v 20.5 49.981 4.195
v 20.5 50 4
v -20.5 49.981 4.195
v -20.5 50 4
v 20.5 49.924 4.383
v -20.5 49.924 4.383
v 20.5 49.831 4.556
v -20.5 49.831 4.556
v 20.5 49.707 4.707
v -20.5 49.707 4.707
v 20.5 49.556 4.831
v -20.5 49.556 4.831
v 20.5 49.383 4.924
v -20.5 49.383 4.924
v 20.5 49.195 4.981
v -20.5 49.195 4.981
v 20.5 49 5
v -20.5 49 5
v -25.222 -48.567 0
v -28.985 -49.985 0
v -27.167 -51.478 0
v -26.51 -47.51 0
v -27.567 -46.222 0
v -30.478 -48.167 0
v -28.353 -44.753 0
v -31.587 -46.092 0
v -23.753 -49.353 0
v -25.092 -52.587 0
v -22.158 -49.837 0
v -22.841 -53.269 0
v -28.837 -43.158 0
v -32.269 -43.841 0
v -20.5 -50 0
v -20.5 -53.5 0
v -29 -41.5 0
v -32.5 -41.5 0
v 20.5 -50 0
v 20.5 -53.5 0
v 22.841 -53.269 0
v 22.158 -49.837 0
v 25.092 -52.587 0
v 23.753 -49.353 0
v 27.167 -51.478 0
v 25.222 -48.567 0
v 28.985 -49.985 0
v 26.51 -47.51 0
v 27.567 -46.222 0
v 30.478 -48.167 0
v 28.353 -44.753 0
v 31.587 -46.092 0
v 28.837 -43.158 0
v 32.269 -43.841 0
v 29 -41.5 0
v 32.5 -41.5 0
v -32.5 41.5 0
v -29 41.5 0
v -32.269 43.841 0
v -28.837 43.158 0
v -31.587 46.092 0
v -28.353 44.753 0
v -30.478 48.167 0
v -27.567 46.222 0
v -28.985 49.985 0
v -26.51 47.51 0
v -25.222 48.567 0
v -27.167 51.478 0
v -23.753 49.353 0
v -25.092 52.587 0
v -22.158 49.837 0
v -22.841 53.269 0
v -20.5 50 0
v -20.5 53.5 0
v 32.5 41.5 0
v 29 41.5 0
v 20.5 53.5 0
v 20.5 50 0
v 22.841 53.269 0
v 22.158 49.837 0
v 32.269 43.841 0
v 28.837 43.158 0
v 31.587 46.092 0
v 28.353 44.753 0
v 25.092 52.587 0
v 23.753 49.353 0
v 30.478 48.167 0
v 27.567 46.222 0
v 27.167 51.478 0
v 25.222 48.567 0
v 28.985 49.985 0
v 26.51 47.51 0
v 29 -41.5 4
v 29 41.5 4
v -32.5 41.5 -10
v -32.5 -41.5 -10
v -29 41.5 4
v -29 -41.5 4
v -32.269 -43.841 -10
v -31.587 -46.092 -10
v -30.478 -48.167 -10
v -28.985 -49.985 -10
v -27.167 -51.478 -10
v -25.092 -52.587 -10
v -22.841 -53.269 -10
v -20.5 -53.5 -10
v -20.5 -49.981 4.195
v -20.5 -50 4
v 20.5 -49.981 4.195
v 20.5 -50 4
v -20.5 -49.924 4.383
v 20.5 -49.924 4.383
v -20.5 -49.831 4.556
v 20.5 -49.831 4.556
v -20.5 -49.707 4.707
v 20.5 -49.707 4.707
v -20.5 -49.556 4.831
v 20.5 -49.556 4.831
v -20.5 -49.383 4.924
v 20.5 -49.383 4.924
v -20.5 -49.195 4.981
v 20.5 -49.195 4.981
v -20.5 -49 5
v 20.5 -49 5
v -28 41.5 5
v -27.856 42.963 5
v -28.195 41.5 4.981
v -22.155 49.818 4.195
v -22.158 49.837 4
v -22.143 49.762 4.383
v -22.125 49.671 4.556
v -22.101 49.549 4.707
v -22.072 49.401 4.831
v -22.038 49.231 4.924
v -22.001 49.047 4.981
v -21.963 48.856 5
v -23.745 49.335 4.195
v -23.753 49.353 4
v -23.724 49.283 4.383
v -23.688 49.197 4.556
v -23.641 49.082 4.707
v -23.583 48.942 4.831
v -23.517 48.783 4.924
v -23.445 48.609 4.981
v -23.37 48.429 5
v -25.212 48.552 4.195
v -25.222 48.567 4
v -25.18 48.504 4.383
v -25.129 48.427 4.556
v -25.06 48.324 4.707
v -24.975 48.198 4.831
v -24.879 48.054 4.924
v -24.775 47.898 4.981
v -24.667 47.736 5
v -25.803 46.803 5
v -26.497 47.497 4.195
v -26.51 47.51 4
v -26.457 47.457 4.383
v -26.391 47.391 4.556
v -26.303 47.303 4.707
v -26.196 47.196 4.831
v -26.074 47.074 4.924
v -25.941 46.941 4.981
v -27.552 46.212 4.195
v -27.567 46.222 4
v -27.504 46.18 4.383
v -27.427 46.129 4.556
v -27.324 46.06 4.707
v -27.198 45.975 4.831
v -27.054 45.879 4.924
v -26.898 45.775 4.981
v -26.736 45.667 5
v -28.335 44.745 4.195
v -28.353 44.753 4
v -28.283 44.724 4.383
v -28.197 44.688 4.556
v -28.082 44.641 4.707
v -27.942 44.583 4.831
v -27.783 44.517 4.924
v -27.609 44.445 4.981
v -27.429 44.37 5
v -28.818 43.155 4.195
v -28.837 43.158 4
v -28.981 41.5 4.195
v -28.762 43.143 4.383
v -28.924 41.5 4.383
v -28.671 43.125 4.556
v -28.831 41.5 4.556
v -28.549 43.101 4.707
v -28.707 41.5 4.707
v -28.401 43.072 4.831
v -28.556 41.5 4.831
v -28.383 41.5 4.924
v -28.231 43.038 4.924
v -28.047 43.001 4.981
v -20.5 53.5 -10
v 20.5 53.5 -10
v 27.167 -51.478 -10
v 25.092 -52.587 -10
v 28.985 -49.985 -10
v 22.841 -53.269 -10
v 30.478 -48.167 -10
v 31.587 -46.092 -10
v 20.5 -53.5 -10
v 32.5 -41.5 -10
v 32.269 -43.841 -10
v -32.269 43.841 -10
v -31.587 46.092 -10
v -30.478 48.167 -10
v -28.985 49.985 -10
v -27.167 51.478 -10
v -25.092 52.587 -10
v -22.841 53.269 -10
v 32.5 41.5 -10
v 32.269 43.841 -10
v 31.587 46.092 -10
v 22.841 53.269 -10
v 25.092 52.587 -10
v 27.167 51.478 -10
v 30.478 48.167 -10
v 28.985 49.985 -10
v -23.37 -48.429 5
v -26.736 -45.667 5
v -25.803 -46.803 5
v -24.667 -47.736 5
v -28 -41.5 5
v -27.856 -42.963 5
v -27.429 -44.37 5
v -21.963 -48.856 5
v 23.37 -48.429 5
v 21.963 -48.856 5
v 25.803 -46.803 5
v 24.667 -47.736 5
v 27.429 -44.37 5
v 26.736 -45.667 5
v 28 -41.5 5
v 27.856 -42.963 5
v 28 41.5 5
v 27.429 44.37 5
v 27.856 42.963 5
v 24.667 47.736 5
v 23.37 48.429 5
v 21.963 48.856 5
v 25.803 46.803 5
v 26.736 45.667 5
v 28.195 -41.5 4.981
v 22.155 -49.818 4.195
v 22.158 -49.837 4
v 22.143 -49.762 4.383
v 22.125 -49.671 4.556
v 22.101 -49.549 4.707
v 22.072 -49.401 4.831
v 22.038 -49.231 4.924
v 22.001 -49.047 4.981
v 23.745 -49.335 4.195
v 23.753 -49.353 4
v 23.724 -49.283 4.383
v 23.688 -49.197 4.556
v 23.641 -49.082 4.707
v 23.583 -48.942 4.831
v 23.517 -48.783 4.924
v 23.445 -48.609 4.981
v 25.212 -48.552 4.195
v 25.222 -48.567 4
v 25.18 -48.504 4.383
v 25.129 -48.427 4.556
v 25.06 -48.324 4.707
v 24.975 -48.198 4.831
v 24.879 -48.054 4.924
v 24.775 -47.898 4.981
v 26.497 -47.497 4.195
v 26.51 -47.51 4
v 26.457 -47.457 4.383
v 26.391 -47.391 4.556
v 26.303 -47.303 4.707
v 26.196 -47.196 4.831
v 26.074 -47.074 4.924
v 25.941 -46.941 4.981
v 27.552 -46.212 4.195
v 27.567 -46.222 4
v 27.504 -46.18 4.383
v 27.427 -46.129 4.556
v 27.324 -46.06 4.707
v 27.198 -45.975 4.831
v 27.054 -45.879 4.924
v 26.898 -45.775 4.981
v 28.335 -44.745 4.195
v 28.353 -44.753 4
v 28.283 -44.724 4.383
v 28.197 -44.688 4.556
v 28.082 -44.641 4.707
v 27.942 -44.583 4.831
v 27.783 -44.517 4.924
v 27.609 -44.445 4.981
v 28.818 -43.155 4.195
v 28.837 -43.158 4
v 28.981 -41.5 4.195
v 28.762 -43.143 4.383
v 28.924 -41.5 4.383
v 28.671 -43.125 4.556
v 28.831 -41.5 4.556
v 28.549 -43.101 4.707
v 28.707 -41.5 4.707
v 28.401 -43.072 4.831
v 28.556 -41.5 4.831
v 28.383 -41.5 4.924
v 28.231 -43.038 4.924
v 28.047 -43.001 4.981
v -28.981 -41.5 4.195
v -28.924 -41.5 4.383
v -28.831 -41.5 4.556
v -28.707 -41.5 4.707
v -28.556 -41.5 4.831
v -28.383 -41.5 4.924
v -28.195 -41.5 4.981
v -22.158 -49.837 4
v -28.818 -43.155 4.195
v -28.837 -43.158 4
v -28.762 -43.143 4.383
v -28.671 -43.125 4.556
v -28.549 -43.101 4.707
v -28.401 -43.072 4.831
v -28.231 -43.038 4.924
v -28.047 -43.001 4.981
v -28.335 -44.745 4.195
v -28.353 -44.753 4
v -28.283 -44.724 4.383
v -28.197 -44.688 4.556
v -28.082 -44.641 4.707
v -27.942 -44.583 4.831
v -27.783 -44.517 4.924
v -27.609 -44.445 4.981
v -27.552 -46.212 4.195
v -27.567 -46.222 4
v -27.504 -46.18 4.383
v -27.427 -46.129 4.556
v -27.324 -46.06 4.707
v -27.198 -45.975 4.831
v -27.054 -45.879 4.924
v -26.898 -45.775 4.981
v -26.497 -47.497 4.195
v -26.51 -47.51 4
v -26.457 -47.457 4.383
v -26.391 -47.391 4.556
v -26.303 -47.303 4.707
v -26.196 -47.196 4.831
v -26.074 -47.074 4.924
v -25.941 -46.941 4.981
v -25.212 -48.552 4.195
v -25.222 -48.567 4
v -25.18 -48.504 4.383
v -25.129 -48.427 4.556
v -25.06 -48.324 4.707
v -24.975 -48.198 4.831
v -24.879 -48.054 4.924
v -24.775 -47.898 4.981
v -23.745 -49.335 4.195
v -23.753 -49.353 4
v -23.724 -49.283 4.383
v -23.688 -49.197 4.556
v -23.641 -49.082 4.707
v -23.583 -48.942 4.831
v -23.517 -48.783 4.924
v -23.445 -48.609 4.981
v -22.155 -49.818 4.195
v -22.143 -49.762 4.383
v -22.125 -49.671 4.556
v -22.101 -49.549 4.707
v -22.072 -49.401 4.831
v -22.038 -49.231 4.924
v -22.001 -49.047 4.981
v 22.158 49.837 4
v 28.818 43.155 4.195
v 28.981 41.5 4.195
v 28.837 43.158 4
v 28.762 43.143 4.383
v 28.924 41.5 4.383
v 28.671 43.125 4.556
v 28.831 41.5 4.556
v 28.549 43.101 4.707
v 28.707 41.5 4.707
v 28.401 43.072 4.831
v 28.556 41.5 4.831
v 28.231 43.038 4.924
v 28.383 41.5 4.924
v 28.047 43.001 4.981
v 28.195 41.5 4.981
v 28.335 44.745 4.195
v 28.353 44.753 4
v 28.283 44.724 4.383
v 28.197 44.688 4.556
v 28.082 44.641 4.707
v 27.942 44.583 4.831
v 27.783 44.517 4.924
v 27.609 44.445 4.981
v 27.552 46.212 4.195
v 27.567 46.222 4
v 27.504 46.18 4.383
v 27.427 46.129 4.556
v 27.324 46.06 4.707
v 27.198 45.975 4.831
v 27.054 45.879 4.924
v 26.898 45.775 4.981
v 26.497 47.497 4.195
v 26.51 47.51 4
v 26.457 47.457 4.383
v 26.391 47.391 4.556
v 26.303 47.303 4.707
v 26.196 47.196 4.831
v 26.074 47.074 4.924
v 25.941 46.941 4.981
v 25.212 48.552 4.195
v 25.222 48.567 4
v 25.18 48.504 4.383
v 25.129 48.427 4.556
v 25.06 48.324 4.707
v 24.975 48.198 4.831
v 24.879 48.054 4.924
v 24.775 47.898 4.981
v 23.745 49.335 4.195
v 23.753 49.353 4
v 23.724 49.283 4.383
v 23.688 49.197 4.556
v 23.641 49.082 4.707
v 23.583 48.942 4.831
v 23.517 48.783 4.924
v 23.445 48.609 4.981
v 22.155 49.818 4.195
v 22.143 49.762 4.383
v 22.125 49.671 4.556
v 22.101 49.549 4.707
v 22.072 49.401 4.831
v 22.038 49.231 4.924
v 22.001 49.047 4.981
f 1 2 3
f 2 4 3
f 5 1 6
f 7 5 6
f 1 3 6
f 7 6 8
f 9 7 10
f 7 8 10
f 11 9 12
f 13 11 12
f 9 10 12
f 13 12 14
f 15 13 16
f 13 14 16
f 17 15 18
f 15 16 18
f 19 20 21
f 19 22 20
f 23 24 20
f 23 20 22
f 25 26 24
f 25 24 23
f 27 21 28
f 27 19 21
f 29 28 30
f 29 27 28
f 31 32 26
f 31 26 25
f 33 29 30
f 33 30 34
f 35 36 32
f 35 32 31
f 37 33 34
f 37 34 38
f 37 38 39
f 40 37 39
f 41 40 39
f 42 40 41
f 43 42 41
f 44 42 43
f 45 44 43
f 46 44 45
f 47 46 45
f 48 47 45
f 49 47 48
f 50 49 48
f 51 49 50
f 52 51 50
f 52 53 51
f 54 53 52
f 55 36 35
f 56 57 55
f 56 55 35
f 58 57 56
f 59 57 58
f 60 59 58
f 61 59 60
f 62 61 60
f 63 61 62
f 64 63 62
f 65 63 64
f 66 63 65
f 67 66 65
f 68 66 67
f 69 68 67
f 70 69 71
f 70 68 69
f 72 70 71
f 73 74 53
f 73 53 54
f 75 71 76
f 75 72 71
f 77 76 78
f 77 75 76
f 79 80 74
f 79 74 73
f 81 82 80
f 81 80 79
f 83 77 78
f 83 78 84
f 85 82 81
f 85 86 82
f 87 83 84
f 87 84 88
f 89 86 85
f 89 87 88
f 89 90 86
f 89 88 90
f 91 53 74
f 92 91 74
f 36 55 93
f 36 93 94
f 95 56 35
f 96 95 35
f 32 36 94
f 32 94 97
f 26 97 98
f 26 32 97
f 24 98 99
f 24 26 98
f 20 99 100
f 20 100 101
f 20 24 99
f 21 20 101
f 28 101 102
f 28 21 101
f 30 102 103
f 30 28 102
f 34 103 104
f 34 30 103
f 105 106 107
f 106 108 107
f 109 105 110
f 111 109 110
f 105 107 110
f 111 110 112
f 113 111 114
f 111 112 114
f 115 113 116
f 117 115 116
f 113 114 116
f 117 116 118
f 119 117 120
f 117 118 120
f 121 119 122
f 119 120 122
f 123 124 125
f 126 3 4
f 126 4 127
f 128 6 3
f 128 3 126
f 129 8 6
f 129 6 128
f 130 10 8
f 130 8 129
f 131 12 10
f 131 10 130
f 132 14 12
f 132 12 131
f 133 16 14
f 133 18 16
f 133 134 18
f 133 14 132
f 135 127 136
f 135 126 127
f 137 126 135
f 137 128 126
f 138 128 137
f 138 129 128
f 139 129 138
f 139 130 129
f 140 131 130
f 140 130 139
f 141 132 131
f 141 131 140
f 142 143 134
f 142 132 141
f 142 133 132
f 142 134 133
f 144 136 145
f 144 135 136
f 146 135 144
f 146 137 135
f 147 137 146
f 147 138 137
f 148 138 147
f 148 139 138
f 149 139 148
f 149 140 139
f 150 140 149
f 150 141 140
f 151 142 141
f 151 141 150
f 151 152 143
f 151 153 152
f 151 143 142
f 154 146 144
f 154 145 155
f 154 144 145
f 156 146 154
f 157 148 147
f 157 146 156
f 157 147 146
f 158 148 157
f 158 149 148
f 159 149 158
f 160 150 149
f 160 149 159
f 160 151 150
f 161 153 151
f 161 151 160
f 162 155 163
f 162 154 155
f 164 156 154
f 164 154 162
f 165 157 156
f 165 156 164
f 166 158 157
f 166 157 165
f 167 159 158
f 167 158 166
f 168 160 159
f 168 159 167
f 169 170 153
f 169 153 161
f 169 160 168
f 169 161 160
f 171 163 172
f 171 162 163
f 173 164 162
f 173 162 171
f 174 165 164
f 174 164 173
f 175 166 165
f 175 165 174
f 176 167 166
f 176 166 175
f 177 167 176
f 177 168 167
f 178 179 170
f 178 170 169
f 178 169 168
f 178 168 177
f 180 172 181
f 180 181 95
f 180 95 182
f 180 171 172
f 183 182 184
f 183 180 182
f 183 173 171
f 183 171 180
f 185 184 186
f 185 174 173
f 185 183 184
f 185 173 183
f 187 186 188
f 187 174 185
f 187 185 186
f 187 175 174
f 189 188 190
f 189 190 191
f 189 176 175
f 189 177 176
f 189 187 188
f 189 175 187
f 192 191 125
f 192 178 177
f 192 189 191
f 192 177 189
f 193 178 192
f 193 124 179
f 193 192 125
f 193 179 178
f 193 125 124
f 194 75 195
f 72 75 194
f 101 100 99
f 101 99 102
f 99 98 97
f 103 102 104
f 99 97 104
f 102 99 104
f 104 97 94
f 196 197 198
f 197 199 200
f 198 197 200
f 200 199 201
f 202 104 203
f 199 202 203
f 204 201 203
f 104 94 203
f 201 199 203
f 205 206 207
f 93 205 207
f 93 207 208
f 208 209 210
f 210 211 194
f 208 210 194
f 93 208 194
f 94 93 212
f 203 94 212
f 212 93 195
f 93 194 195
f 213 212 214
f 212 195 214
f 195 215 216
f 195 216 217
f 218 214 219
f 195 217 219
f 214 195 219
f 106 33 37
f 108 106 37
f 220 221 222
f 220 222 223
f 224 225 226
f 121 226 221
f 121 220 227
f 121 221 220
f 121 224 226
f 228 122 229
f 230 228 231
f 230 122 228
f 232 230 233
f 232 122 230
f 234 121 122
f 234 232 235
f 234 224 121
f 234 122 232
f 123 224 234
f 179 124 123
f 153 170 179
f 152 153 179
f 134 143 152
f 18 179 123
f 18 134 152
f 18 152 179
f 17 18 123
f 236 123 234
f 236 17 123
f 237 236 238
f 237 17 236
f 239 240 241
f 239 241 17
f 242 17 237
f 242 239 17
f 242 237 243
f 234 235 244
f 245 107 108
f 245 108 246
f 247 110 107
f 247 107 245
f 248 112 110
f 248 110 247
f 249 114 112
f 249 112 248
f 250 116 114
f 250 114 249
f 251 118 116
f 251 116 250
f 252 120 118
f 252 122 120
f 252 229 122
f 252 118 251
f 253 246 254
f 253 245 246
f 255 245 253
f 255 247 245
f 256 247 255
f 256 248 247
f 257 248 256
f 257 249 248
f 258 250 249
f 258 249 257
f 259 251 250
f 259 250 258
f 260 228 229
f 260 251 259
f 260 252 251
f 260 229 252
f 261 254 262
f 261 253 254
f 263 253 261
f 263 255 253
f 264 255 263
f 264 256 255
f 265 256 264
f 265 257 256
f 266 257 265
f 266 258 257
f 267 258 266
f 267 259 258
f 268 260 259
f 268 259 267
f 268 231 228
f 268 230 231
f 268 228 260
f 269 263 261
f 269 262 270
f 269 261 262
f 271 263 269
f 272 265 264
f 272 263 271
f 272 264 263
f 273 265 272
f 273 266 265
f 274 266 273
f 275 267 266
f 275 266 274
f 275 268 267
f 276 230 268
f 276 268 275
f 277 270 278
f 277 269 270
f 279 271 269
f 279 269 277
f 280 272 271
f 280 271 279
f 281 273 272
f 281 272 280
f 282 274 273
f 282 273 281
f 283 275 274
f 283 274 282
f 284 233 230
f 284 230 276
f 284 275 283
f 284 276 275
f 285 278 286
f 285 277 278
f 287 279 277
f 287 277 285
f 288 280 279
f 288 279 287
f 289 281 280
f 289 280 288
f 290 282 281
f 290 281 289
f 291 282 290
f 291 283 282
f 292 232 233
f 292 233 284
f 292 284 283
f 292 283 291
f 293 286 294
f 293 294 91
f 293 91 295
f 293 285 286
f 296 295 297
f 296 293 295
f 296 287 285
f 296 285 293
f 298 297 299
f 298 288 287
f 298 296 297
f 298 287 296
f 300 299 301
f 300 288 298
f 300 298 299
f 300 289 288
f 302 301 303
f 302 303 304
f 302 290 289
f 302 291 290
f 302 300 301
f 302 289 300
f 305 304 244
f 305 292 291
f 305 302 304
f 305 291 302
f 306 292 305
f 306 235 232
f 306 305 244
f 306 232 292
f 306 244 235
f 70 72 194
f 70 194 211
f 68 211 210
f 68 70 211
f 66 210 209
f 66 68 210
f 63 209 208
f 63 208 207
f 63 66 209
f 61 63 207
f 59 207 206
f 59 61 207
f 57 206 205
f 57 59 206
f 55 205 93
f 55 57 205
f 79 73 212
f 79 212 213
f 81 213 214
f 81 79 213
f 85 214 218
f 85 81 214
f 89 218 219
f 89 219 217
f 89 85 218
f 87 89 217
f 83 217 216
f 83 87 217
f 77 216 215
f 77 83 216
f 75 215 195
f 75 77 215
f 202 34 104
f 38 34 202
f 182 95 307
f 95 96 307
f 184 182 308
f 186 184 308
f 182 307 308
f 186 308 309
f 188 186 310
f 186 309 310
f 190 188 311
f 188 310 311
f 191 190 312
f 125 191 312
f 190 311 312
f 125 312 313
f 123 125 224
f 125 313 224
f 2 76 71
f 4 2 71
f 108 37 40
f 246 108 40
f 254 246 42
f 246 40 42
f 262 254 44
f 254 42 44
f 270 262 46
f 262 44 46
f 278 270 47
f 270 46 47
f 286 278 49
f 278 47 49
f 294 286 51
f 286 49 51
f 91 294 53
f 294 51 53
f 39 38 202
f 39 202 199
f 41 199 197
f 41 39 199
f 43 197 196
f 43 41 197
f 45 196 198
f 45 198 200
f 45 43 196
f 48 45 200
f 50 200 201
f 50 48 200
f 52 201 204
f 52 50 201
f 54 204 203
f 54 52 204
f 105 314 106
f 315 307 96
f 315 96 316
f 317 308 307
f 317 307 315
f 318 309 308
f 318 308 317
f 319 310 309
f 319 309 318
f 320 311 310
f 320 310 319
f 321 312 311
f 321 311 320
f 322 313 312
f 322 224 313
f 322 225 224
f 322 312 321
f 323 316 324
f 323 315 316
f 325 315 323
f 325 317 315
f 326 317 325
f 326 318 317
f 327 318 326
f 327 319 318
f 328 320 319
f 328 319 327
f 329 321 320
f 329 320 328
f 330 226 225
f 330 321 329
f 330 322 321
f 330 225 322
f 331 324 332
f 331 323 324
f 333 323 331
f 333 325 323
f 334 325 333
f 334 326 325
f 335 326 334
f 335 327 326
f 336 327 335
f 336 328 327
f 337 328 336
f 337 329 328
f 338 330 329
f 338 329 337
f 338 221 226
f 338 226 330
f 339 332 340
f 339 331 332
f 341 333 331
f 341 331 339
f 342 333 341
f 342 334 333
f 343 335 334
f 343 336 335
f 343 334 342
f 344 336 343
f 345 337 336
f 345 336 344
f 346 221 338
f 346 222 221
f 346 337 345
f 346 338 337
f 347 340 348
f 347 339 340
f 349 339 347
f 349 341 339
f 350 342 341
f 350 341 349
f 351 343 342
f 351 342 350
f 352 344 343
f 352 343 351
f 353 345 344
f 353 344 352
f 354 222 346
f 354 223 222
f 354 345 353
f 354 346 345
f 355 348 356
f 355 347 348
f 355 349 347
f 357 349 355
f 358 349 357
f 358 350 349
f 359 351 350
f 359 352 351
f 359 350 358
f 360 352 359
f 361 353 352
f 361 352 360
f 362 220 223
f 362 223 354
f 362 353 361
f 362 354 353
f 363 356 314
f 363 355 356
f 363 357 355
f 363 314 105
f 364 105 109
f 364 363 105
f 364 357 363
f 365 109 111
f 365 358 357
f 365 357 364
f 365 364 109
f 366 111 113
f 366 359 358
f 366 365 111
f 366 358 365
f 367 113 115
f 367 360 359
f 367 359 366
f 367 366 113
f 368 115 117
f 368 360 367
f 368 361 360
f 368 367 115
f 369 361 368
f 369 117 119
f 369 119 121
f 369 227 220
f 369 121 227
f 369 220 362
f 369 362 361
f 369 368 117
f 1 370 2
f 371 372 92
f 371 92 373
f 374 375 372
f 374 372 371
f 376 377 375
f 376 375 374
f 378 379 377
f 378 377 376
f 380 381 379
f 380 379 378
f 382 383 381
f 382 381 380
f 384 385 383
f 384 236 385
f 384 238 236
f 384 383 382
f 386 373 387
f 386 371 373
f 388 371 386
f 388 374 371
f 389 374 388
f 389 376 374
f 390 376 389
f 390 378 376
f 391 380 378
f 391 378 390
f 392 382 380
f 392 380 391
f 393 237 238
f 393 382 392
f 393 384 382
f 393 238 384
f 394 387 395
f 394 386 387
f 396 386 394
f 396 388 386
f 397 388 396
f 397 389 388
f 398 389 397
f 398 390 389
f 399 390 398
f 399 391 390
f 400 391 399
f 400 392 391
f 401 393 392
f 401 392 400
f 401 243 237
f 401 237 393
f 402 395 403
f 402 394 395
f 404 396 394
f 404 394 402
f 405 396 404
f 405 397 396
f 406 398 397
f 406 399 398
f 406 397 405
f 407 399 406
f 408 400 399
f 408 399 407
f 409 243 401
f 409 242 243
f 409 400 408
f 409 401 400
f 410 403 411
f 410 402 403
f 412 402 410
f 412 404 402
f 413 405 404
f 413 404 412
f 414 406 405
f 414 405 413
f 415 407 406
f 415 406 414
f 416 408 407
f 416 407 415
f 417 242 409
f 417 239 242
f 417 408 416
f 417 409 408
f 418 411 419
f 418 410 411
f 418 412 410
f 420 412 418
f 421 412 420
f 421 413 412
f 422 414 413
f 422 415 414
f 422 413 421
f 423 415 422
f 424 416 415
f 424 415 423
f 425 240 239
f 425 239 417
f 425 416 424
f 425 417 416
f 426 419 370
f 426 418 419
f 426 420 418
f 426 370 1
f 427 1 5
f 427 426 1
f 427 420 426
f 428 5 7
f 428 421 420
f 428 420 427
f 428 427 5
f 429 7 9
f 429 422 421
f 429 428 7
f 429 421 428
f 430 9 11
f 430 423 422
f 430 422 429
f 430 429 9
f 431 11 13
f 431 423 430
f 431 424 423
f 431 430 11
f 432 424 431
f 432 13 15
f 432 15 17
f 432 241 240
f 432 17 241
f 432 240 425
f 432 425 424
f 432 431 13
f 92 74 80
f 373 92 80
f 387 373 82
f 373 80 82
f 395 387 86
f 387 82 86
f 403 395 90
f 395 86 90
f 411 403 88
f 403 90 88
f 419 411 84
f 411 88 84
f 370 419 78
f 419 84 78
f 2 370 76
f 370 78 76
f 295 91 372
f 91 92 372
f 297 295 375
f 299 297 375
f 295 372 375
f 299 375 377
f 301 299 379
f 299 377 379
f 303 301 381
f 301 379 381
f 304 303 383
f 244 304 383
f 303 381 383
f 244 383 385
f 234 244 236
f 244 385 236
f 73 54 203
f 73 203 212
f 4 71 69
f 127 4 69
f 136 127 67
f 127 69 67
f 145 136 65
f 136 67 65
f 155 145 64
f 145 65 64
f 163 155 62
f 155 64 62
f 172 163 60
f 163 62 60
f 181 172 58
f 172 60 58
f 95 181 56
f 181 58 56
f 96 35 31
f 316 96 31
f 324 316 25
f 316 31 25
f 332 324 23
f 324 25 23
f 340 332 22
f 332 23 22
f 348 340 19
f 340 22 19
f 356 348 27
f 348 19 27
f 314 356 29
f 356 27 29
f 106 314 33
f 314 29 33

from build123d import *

# Parameters (mm, degrees)
F1_DEPTH = 5
F3_DEPTH = 10
F4_R     = 1


# Not quite as in the source:
# - a feature names something its author has since deleted; it is built from what else it names


with BuildPart() as f1:
    # F0 (on Top) → F1 (new body)
    with BuildSketch(Plane.XY):
        with BuildLine():
            Line((29, -41.5), (29, 41.5))
            ThreePointArc((29, 41.5), (26.5104076401, 47.5104076401), (20.5, 50))
            Line((20.5, 50), (-20.5, 50))
            ThreePointArc((-20.5, 50), (-26.5104076401, 47.5104076401), (-29, 41.5))
            Line((-29, 41.5), (-29, -41.5))
            ThreePointArc((-29, -41.5), (-26.5104076401, -47.5104076401), (-20.5, -50))
            Line((-20.5, -50), (20.5, -50))
            ThreePointArc((20.5, -50), (26.5104076401, -47.5104076401), (29, -41.5))
        make_face()
    extrude(amount=F1_DEPTH)

    # F2 (on Top) → F3 (join)
    with BuildSketch(Plane.XY):
        with BuildLine():
            ThreePointArc((32.5, 41.5), (28.9852813742, 49.9852813742), (20.5, 53.5))
            Line((20.5, 53.5), (-20.5, 53.5))
            ThreePointArc((-20.5, 53.5), (-28.9852813742, 49.9852813742), (-32.5, 41.5))
            Line((-32.5, 41.5), (-32.5, -41.5))
            ThreePointArc((-32.5, -41.5), (-28.9852813742, -49.9852813742), (-20.5, -53.5))
            Line((-20.5, -53.5), (20.5, -53.5))
            ThreePointArc((20.5, -53.5), (28.9852813742, -49.9852813742), (32.5, -41.5))
            Line((32.5, -41.5), (32.5, 41.5))
        make_face()
    extrude(amount=-F3_DEPTH)

    # F4
    f4_edges = [f1.edges().sort_by_distance(p)[0] for p in [
        (0, 50, 5),
        (-26.510408, 47.510408, 5),
        (-29, 0, 5),
        (-26.510408, -47.510408, 5),
        (0, -50, 5),
        (26.510408, -47.510408, 5),
        (29, 0, 5),
        (26.510408, 47.510408, 5),
    ]]
    fillet(f4_edges, radius=F4_R)


solid = f1.part
